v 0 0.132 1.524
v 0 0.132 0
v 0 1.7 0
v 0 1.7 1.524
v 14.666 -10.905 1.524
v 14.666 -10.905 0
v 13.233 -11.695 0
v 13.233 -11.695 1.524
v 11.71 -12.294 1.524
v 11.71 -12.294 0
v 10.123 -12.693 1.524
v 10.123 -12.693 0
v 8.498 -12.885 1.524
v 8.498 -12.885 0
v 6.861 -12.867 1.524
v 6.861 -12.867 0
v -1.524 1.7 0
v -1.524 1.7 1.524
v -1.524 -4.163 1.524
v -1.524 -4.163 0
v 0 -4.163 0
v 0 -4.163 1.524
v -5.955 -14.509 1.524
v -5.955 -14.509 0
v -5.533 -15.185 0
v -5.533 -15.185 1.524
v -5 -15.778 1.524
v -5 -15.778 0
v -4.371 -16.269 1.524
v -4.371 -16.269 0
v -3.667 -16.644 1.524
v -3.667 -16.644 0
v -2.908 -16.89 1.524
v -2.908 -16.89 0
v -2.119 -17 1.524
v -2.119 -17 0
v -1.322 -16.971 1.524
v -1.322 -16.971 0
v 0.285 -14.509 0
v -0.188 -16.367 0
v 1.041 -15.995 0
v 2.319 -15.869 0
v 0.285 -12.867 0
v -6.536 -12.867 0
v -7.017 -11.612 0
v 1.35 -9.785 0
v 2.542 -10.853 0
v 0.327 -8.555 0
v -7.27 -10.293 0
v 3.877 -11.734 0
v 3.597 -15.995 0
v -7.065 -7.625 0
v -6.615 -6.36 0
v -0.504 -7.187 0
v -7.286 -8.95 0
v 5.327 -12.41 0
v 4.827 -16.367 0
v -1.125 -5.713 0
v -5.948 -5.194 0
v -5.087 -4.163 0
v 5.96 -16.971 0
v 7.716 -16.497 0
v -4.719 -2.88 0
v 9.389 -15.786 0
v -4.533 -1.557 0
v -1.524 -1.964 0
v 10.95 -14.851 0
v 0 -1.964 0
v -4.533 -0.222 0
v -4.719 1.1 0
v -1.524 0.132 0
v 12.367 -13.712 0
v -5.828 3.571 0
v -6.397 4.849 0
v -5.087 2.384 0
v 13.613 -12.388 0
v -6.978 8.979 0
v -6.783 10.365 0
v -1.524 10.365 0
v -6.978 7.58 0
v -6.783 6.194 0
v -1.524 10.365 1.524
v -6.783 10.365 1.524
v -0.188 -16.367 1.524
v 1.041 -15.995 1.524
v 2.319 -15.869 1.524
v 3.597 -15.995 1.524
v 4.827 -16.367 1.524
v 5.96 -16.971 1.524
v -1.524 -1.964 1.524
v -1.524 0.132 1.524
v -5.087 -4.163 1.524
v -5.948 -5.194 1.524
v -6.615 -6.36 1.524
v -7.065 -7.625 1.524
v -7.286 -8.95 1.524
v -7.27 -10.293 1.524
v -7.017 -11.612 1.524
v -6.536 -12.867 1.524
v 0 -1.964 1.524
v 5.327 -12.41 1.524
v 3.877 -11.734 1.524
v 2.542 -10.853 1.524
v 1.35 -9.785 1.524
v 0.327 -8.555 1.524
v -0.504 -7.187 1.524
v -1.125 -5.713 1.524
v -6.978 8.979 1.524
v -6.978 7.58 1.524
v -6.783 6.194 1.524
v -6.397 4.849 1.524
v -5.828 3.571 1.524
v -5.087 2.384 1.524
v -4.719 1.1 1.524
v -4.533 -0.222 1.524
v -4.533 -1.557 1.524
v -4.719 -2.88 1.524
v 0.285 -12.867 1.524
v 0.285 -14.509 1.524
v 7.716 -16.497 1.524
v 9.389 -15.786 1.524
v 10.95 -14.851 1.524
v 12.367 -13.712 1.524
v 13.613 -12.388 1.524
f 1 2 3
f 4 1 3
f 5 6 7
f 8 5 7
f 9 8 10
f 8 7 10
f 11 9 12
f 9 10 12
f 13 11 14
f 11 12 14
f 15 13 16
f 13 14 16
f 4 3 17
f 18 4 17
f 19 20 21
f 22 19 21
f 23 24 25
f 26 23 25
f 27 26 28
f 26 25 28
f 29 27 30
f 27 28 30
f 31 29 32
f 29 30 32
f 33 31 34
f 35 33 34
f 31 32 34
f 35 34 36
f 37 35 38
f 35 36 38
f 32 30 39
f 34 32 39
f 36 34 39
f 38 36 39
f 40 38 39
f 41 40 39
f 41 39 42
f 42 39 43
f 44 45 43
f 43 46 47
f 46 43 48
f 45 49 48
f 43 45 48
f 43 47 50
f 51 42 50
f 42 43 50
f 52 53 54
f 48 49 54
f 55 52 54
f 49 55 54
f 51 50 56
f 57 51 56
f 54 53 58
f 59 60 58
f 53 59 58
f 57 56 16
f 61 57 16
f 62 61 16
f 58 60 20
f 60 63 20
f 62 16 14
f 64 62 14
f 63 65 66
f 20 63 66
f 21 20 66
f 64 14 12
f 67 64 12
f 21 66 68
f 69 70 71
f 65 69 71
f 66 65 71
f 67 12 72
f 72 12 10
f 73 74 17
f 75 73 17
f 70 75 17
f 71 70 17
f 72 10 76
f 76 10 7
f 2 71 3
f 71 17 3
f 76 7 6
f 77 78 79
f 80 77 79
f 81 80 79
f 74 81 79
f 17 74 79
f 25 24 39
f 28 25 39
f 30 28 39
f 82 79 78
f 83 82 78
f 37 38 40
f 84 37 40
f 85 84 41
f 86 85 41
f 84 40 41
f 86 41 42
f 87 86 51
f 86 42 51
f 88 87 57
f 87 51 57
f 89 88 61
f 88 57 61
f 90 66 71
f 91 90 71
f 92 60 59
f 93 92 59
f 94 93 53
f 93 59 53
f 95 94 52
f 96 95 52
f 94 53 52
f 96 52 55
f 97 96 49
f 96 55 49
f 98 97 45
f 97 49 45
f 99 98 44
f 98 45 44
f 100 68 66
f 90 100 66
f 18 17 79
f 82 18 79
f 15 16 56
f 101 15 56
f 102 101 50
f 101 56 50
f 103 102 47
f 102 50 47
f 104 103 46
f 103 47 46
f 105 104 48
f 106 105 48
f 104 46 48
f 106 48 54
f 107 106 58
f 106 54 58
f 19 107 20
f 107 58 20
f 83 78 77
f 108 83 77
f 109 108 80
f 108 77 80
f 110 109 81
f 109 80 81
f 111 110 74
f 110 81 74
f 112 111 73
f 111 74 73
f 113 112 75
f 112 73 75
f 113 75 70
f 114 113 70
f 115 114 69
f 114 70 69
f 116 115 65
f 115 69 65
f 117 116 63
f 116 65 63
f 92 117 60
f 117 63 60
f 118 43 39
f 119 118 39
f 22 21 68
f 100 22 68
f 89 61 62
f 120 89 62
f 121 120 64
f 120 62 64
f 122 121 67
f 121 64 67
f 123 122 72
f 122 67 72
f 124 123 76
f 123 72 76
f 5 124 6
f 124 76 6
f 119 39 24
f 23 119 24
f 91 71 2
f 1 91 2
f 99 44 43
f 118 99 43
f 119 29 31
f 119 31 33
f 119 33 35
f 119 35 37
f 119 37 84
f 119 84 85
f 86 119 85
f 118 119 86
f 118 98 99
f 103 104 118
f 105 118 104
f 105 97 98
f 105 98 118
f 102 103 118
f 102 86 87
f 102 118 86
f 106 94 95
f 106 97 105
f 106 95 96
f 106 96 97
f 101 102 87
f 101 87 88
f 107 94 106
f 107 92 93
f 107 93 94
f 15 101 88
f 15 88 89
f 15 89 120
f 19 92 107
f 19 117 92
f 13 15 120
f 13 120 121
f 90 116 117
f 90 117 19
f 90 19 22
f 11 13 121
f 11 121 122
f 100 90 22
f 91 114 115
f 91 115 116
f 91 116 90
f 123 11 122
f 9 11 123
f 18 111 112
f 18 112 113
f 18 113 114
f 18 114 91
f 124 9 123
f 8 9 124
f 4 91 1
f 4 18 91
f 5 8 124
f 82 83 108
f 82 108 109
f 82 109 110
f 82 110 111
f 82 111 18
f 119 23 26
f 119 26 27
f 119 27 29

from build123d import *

# Parameters (mm, degrees)
BOSS_EXTRUDE1_DEPTH = 1.524


with BuildPart() as part:
    # Sketch1 → Boss-Extrude1 (new body)
    with BuildSketch(Plane.XY):
        with BuildLine():
            Line((0, -1.964327556), (-1.524, -1.964327556))
            Line((-1.524, -1.964327556), (-1.524, 0.132092651))
            Line((-1.524, 0.132092651), (0, 0.132092651))
            Line((0, 0.132092651), (0, 1.699735594))
            Line((0, 1.699735594), (-1.524, 1.699735594))
            Line((-1.524, 1.699735594), (-1.524, 7.30837055))
            Line((-1.524, 7.30837055), (-1.524, 10.365124178))
            Line((-1.524, 10.365124178), (-6.782878703, 10.365124178))
            ThreePointArc((-6.782878703, 10.365124178), (-6.783116279, 6.194251187), (-5.086577691, 2.384009936))
            ThreePointArc((-5.086577691, 2.384009936), (-4.509773665, -0.889665066), (-5.086577691, -4.163340068))
            ThreePointArc((-5.086577691, -4.163340068), (-7.205112449, -8.282791607), (-6.536296983, -12.866540768))
            Line((-6.536296983, -12.866540768), (0.285426682, -12.866540768))
            Line((0.285426682, -12.866540768), (0.285426682, -14.508842733))
            Line((0.285426682, -14.508842733), (-5.954978709, -14.508842733))
            ThreePointArc((-5.954978709, -14.508842733), (-4.027344351, -16.471916174), (-1.321752383, -16.971119191))
            ThreePointArc((-1.321752383, -16.971119191), (2.319118957, -15.86929322), (5.959990297, -16.971119191))
            ThreePointArc((5.959990297, -16.971119191), (10.949556437, -14.851489508), (14.666489015, -10.905223871))
            ThreePointArc((14.666489015, -10.905223871), (10.922843112, -12.5189914), (6.861028282, -12.866540768))
            ThreePointArc((6.861028282, -12.866540768), (1.349866502, -9.785380814), (-1.524, -4.163340068))
            Line((-1.524, -4.163340068), (0, -4.163340068))
            Line((0, -4.163340068), (0, -1.964327556))
        make_face()
    extrude(amount=BOSS_EXTRUDE1_DEPTH)


solid = part.part
